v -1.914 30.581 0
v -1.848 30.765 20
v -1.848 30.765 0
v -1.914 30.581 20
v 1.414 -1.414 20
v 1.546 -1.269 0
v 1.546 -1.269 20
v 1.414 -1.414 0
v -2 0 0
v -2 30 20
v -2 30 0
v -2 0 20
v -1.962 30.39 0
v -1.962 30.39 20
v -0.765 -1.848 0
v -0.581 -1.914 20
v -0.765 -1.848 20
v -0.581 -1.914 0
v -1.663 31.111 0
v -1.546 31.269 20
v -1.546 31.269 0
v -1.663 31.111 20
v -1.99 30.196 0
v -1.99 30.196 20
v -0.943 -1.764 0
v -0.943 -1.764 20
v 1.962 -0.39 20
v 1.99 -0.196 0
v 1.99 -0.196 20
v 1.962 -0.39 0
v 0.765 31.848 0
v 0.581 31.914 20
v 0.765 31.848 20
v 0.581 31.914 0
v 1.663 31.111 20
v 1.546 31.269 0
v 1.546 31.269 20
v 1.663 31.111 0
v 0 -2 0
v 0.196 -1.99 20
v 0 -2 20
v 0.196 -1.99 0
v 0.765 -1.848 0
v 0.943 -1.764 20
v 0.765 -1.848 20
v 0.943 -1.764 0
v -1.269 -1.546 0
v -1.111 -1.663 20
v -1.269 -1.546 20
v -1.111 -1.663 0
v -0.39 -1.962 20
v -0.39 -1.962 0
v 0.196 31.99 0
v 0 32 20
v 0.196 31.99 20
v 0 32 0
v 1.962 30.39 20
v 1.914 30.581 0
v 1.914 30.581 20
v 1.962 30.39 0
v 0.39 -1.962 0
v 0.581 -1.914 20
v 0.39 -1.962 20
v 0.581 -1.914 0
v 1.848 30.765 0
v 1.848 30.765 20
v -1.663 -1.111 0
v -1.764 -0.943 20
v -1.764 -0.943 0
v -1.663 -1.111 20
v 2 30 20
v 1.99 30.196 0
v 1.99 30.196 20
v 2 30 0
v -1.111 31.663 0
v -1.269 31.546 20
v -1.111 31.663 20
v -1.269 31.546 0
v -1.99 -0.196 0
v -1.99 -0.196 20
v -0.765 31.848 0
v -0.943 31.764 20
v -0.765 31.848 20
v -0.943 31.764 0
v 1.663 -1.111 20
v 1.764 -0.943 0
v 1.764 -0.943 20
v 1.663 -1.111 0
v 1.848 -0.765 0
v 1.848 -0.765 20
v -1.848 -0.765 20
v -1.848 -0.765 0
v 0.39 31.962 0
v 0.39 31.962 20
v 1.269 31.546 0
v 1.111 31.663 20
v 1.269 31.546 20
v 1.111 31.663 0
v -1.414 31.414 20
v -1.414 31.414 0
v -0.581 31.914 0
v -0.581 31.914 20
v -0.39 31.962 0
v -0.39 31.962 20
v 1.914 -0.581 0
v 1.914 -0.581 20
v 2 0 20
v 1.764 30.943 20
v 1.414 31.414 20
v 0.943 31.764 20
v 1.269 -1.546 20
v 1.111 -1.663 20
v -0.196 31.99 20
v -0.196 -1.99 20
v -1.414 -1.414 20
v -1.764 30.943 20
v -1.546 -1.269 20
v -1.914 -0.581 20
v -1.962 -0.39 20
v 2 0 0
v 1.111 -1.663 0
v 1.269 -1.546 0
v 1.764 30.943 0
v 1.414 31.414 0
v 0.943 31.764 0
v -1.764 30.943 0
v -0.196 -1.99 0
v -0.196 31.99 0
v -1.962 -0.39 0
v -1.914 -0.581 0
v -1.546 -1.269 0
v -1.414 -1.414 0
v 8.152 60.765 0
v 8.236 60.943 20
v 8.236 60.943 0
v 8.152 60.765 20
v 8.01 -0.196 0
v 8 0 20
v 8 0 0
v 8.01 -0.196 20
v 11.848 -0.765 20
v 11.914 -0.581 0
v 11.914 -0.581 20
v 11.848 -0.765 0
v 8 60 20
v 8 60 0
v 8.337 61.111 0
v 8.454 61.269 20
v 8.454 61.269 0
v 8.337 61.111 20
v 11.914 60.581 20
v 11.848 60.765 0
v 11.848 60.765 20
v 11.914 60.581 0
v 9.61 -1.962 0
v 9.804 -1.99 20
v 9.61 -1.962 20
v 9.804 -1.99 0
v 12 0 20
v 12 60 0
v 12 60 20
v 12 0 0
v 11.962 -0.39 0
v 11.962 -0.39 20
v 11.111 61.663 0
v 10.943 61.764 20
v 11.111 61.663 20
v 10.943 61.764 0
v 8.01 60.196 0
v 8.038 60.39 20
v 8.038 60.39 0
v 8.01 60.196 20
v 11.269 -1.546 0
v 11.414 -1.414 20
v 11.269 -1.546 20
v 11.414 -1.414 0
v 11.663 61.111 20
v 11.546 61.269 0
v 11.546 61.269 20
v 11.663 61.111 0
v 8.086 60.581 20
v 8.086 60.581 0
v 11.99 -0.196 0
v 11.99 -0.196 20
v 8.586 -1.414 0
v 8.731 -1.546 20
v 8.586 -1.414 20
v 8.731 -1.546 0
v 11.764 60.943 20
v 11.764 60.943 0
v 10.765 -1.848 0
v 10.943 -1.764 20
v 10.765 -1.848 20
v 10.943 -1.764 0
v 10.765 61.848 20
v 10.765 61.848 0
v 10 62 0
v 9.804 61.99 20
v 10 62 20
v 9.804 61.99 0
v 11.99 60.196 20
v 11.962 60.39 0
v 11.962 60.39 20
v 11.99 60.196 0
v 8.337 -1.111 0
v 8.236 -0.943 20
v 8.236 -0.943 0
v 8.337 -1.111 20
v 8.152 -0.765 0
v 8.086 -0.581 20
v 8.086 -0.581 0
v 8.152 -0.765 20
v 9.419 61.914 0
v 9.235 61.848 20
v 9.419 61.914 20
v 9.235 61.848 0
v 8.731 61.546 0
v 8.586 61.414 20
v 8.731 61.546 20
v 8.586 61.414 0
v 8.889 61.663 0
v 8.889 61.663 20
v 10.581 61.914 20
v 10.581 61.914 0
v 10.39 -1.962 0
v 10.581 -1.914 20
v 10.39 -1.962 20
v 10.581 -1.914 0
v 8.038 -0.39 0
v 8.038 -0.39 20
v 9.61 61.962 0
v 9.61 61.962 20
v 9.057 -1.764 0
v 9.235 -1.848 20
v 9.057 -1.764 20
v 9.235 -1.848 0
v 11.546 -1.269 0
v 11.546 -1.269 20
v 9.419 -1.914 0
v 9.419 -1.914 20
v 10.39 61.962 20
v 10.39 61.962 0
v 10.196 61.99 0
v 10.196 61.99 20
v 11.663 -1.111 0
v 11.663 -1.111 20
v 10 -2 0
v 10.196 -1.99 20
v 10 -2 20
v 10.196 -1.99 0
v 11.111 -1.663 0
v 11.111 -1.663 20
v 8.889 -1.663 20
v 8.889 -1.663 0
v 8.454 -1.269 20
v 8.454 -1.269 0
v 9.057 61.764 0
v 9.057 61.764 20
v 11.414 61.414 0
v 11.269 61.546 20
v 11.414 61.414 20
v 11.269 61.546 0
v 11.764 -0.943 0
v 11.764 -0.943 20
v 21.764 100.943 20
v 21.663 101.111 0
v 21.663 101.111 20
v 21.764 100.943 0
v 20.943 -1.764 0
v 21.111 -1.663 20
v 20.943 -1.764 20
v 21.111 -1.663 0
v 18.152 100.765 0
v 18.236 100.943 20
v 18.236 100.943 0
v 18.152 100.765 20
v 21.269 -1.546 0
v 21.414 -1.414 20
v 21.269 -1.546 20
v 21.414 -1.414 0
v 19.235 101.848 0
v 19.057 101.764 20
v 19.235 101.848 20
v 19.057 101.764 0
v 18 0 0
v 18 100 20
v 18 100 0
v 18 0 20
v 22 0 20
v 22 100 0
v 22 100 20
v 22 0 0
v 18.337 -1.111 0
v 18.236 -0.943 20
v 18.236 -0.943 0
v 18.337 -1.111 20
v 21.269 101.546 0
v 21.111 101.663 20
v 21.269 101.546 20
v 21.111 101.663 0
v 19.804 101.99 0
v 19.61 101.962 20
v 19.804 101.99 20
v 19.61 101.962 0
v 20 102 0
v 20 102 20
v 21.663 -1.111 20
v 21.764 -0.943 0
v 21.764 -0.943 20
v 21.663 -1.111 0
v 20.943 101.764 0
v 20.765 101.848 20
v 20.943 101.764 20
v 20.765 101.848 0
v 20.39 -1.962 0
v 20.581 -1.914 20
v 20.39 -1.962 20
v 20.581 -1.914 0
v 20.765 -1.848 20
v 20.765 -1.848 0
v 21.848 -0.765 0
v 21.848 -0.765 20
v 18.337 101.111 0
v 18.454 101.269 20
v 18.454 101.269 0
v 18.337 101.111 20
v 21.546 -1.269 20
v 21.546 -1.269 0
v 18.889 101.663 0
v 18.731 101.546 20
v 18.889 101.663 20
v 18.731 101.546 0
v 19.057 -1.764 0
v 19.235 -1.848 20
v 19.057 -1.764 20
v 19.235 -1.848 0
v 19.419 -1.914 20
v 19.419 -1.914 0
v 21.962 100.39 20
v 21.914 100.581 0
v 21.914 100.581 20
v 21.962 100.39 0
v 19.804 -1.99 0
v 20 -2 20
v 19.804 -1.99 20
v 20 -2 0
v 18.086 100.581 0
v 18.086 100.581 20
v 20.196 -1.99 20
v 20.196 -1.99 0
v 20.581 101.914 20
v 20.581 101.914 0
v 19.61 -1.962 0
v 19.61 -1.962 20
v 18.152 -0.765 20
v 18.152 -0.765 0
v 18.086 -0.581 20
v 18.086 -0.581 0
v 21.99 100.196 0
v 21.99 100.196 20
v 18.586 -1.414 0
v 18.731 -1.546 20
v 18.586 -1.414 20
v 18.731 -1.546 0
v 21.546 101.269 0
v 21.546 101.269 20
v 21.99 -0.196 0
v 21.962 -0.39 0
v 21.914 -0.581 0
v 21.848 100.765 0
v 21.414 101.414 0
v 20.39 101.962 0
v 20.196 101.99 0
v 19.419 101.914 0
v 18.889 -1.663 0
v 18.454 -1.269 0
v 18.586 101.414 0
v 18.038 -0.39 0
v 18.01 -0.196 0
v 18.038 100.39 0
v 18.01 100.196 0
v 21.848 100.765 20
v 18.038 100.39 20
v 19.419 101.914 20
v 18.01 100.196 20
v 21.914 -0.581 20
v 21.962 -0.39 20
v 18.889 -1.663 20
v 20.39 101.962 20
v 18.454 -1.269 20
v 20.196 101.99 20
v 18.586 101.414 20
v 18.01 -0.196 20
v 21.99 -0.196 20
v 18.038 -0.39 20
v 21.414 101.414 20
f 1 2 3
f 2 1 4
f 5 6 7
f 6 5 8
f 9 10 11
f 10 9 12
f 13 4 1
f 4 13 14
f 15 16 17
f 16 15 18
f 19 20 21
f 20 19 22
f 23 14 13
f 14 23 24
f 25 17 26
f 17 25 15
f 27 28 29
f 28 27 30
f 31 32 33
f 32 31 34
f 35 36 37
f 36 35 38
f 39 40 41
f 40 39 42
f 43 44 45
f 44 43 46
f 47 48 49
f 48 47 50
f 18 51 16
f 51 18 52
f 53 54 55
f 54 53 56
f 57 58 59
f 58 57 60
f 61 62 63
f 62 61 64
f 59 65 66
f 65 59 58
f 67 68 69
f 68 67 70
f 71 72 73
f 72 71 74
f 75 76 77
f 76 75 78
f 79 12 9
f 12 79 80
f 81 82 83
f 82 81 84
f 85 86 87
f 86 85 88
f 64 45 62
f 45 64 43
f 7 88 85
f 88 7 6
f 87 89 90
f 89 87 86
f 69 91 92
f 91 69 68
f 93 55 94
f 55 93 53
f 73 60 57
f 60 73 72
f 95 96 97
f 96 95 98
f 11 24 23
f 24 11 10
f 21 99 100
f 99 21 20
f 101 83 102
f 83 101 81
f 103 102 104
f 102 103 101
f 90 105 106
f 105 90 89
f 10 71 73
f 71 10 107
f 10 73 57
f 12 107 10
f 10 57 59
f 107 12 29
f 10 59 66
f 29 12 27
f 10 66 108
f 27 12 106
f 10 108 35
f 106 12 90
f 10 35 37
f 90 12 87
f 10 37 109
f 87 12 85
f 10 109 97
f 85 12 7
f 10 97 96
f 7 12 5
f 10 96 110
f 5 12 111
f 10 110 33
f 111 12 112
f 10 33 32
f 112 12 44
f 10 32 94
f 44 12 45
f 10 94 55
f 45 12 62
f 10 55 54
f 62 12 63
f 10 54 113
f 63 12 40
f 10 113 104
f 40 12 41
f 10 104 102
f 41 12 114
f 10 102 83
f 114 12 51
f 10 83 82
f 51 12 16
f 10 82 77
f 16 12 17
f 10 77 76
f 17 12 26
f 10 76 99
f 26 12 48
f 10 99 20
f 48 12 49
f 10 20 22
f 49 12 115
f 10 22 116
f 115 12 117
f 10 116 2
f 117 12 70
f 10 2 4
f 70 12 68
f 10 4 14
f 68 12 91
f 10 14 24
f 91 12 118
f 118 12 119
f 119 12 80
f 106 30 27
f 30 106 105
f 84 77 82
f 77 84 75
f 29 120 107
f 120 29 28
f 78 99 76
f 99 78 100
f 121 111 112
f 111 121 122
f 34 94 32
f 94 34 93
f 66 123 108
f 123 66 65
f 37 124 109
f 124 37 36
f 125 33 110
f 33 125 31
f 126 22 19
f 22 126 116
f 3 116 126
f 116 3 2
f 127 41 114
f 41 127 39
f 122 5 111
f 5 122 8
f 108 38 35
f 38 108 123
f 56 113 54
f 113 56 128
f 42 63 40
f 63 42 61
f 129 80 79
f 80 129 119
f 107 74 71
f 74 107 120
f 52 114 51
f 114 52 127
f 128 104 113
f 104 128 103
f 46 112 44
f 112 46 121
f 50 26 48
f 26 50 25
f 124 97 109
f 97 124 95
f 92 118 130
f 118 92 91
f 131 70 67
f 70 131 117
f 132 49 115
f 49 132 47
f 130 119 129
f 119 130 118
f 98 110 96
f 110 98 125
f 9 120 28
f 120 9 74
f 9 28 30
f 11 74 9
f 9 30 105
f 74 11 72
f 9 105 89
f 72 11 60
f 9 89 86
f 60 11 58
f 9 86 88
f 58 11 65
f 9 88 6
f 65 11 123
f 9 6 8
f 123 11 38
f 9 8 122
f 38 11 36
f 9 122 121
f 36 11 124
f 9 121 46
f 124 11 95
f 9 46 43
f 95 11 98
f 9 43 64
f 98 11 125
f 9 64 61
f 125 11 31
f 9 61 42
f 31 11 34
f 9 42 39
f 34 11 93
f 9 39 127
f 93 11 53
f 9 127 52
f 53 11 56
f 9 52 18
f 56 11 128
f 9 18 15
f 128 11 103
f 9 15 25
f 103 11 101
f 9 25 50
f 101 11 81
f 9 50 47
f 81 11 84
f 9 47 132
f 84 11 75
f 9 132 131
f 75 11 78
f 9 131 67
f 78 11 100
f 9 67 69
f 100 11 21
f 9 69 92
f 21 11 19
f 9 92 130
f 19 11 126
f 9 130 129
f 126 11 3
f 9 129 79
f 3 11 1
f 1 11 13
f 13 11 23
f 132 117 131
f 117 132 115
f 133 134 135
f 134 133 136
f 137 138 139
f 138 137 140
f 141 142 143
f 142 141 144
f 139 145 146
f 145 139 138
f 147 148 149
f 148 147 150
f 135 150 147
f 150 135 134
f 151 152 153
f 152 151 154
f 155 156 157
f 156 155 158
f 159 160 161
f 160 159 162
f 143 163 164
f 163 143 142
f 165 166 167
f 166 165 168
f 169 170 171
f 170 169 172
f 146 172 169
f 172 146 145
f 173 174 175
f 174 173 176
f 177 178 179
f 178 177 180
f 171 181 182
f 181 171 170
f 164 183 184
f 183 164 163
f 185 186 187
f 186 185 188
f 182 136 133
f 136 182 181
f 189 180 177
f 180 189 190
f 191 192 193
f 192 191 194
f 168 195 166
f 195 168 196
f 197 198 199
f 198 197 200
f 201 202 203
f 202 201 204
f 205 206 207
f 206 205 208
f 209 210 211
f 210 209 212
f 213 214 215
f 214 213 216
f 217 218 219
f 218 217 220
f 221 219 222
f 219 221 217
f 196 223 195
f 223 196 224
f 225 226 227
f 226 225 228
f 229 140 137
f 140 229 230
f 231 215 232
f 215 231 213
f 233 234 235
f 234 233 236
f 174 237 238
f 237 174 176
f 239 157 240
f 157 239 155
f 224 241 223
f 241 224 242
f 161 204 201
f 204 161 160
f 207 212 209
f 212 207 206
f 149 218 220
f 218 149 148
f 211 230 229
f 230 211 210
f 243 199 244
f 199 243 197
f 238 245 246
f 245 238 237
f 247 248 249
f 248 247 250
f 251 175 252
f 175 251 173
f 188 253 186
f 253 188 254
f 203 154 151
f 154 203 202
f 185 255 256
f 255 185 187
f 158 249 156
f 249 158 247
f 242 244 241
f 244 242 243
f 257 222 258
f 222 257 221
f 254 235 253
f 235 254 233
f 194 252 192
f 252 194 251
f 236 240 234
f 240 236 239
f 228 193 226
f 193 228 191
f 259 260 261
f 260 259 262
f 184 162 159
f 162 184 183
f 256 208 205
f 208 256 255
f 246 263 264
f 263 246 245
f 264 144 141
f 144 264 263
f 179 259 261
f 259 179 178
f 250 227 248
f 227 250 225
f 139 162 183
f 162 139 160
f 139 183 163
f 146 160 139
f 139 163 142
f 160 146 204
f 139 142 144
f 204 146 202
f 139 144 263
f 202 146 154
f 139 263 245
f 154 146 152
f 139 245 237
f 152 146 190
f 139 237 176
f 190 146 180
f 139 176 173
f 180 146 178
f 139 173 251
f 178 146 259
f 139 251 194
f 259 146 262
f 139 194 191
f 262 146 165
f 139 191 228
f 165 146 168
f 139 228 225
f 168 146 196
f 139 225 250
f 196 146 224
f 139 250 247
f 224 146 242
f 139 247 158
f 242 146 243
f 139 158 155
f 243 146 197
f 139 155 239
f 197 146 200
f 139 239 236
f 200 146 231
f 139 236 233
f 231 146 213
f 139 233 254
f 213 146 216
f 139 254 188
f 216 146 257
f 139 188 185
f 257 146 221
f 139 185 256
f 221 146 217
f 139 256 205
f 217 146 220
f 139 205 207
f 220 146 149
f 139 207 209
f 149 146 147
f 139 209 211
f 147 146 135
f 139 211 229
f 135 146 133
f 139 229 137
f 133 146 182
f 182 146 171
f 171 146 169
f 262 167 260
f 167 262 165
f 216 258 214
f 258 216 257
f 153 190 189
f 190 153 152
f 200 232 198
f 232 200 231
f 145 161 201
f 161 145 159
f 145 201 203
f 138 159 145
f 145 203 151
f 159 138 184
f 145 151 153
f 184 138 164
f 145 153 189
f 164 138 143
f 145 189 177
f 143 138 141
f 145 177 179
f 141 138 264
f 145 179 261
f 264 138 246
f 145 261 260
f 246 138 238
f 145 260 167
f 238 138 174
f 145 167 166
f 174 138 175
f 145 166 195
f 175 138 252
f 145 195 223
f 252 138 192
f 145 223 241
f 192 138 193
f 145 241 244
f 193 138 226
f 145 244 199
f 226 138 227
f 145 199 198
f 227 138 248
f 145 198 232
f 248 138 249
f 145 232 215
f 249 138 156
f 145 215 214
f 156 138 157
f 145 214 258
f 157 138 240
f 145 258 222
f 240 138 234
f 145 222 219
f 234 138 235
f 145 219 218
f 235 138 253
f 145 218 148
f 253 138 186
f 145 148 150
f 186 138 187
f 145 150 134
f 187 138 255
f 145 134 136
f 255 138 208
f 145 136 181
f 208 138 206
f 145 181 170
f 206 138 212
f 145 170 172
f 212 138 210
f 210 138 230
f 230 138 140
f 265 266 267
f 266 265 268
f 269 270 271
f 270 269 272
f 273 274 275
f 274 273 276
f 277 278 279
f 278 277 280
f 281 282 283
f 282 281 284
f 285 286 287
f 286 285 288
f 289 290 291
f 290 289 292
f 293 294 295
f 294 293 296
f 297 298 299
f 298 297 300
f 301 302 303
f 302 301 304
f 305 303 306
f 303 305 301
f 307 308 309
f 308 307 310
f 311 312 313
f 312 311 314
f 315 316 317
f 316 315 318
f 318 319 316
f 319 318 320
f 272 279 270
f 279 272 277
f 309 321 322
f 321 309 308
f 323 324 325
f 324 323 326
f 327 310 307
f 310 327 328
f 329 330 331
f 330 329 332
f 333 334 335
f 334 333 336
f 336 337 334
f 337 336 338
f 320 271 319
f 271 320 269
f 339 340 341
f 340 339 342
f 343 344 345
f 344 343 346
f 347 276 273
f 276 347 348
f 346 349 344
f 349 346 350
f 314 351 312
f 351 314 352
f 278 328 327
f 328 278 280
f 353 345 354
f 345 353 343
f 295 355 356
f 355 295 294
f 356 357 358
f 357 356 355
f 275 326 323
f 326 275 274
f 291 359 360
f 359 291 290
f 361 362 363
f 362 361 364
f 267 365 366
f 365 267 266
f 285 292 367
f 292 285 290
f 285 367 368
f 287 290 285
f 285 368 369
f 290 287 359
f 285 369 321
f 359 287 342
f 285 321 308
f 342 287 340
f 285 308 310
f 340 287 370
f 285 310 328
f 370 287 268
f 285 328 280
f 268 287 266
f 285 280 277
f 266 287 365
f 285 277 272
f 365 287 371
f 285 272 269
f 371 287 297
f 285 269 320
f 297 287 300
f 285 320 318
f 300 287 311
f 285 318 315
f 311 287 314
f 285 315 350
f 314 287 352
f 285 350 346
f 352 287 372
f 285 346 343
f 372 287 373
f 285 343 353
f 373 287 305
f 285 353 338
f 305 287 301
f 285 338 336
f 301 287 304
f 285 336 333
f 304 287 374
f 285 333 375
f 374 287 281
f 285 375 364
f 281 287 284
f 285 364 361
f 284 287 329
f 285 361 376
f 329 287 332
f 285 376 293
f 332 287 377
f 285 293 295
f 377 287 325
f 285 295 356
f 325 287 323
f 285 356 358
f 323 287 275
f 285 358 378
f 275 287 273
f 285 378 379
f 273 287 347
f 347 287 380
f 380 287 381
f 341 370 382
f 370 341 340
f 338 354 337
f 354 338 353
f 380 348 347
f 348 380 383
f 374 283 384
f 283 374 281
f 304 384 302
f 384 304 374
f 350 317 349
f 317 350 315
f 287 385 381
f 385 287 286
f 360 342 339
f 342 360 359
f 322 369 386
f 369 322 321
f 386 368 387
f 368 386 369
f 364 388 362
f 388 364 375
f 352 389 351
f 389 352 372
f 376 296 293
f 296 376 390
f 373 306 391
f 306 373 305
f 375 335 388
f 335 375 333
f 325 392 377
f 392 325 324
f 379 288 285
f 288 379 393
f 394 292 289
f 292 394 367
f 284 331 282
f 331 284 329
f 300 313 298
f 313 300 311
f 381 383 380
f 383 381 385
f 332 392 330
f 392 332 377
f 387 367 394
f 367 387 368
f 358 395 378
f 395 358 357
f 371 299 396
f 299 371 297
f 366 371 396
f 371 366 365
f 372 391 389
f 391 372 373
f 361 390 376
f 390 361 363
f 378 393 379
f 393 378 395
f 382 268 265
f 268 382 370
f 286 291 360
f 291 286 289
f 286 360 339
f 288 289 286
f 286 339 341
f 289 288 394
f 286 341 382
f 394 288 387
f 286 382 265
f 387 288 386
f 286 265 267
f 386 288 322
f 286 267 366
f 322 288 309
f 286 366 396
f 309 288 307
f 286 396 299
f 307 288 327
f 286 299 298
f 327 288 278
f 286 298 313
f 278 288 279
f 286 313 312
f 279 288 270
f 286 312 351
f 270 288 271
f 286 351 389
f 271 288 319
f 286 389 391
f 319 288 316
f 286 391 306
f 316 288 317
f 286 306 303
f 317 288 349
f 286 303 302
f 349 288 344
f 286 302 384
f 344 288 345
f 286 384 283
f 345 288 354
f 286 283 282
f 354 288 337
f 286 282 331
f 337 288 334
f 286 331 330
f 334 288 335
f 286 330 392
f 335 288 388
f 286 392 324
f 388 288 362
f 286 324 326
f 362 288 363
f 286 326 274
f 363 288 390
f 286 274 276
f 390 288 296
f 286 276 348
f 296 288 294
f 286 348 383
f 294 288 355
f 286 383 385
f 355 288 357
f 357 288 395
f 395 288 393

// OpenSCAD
//
// Misc library
//
// by Yasuhiro Wabiko
//
// This work is licensed under a Creative Commons Attribution 4.0 International License.
// https://creativecommons.org/licenses/by/4.0/
//
// See
//    https://github.com/ywabiko/3d/blob/master/Speaker/README.md
// for build instructions.
//

WELDING=0.1;

round2_plate(30,20,2);

translate([10,0,0])
  round2_plate(60,20,2);

translate([20,0,0])
  round2_plate(100,20,2);


module round2_plate(width, height, radius)
{
    hull(){
        translate([0,0,0])
            cylinder(r=radius, h=height, $fn=64);
        translate([0,width,0])
            cylinder(r=radius, h=height, $fn=64);
    }
}


module round2_plate_triangled(width, height, radius1, radius2)
{
    hull(){
        translate([0,0,0])
            cylinder(r=radius1, h=height, $fn=64);
        translate([0,width,0])
            cylinder(r=radius2, h=height, $fn=64);
    }
}


// px,py,pz has to be larger than r*2
// alignment: (x,y,z) = (0, py0/2, 0)
module prim_round_cube(px0, py0, pz0,  pr0, pf)
{
    pr = pr0;
    px = px0 - pr*2;
    py = py0 - pr*2;
    pz = pz0 - pr*2;
    translate([(px+pr*2)/2, 0, (pz+pr*2)/2])
    minkowski(){
        cube([px, py, pz], center=true);
        sphere(r=pr, $fn=32);
    }
}

// px,py,pz has to be larger than r*2
// alignment: (x,y,z) = (0, py0/2, 0)
module prim_round_cube0(px0, py0, pz0,  pr0, pf)
{
    pr = pr0;
    px = px0 - pr*2;
    py = py0 - pr*2;
    pz = pz0 - pr*2;
    translate([0, 0, 0])
    minkowski(){
        cube([px, py, pz], center=true);
        sphere(r=pr, $fn=pf);
    }
}

// px0,py0 = width(x-axis),height(y-axis), center at (0,0), facing x-axis posiive
// pz = thickness (z-axis from z=0)
// pr = r
// fn = $fn
module prim_round_xplate(px0, py0, pz0,  pr, pf)
{
    px = px0;
    py = py0-pr*2;
    pz = pz0-pr*2;
      
    hull(){
        translate([0,-py/2,-pz/2])
          rotate([0,90,0])
            cylinder(r=pr, h=px, $fn=pf, center=true);
        translate([0,+py/2, -pz/2])
          rotate([0,90,0])
            cylinder(r=pr,h=px, $fn=pf, center=true);
        translate([0,-py/2, +pz/2])
          rotate([0,90,0])
            cylinder(r=pr,h=px, $fn=pf, center=true);
        translate([0,+py/2, +pz/2])
          rotate([0,90,0])
            cylinder(r=pr, h=px, $fn=pf, center=true);
    }
}

// center at (x/2,y/2,z/2), facing z-axis positive
module prim_round_zplate0(px0, py0, pz0,  pr, pf)
{
    px = px0-pr*2;
    py = py0-pr*2;
    pz = pz0;
    hull(){
        translate([ px/2,  py/2, 0])
            cylinder(r=pr, h=pz, $fn=pf, center=true);
        translate([-px/2,  py/2, 0])
            cylinder(r=pr, h=pz, $fn=pf, center=true);
        translate([ px/2, -py/2, 0])
            cylinder(r=pr, h=pz, $fn=pf, center=true);
        translate([-px/2, -py/2, 0])
            cylinder(r=pr, h=pz, $fn=pf, center=true);
    }    
}

// center at (x/2,y/2,z/2), facing x-axis positive
module prim_round_xplate0(pz0, py0, px0,  pr, pf)
{
    px = px0-pr*2;
    py = py0-pr*2;
    pz = pz0;
    rotate([0,90,0])
    hull(){
        translate([ px/2,  py/2, 0])
            cylinder(r=pr, h=pz, $fn=pf, center=true);
        translate([-px/2,  py/2, 0])
            cylinder(r=pr, h=pz, $fn=pf, center=true);
        translate([ px/2, -py/2, 0])
            cylinder(r=pr, h=pz, $fn=pf, center=true);
        translate([-px/2, -py/2, 0])
            cylinder(r=pr, h=pz, $fn=pf, center=true);
    }    
}

// center at (x/2,y/2,z/2), facing y-axis positive
module prim_round_yplate0(px0, pz0, py0, pr, pf)
{
    px = px0-pr*2;
    py = py0-pr*2;
    pz = pz0;
    rotate([90,0,0])
    hull(){
        translate([ px/2,  py/2, 0])
            cylinder(r=pr, h=pz, $fn=pf, center=true);
        translate([-px/2,  py/2, 0])
            cylinder(r=pr, h=pz, $fn=pf, center=true);
        translate([ px/2, -py/2, 0])
            cylinder(r=pr, h=pz, $fn=pf, center=true);
        translate([-px/2, -py/2, 0])
            cylinder(r=pr, h=pz, $fn=pf, center=true);
    }    
}


//
// Screw Holes
//
default_wall_t = 2;

// [Public]
// #2 1/8" screw hole (diameter 2mm x depth 3mm)
// wall thickness = 2mm by default, so overall dimension is 6mm x 6mm x 5mm high.
// align = { "none" : centered at (0,0,0) facing z-axis positive (same as zplate0)
//           "x"    : aligned to yz-plane, facing x-axis positive.
//           "y"    : aligned to zx-plane, facing y-axis positive.
//           "z"    : aligned to xy-plane, facing z-axis positive.
//          }
module screw_hole_d2_h3(align="none", wall_t = default_wall_t, volume_type="positive",
                        shell_x=0, shell_y=0, shell_z=0, with_shell=0){
    hole_d = 2;
    hole_z = 3;
    screw_hole_body(align=align, hole_d=hole_d, hole_z=hole_z, wall_t=wall_t, volume_type=volume_type,
                    shell_x=shell_x, shell_y=shell_y, shell_z=shell_z, with_shell=with_shell);
}

// [Public]
// #4-3/8" screw (diameter 2.8mm x depth 9.5mm)
// wall thickness = 2mm by default, so overall dimension is 6.8mm x 6.8mm x 9.7mm high.
// align = { "none" : centered at (0,0,0) facing z-axis positive (same as zplate0)
//           "x"    : aligned to yz-plane, facing x-axis positive.
//           "y"    : aligned to zx-plane, facing y-axis positive.
//           "z"    : aligned to xy-plane, facing z-axis positive.
//          }
module screw_hole_d28_h95(align="none", wall_t = default_wall_t, volume_type="positive",
                          shell_x=0, shell_y=0, shell_z=0, with_shell=0)
{
    hole_d = 2.8;
    hole_z = 9.5;
    screw_hole_body(align=align, hole_d=hole_d, hole_z=hole_z, wall_t=wall_t, volume_type=volume_type,
        shell_x=shell_x, shell_y=shell_y, shell_z=shell_z, with_shell=with_shell);
}


//
// internal modules
//

// Calculate shell dimension and delegate to each alignment-specific modules.
module screw_hole_body(align="none", hole_d, hole_z, wall_t = default_wall_t, volume_type="positive",
                       shell_x=0, shell_y=0, shell_z=0, with_shell=0) {

    unit_x = (1-with_shell)*(hole_d+wall_t*2) + with_shell*shell_x;
    unit_y = (1-with_shell)*(hole_d+wall_t*2) + with_shell*shell_y; 
    unit_z = (1-with_shell)*hole_z+wall_t + with_shell*shell_z;

    if (align == "none") {
        screw_hole_zplate0(hole_d=hole_d, hole_z=hole_z, wall_t=wall_t, unit_x=unit_x, unit_y=unit_y, unit_z=unit_z, volume_type=volume_type,
                           shell_x=shell_x, shell_y=shell_y, shell_z=shell_z, with_shell=with_shell);
    }
    if (align == "x") {
        screw_hole_align_x(hole_d=hole_d, hole_z=hole_z, wall_t=wall_t, unit_x=unit_x, unit_y=unit_y, unit_z=unit_z, volume_type=volume_type,
                           shell_x=shell_x, shell_y=shell_y, shell_z=shell_z, with_shell=with_shell);
    }
    if (align == "y") {
        screw_hole_align_y(hole_d=hole_d, hole_z=hole_z, wall_t=wall_t, unit_x=unit_x, unit_y=unit_y, unit_z=unit_z, volume_type=volume_type,
                           shell_x=shell_x, shell_y=shell_y, shell_z=shell_z, with_shell=with_shell);
    }
    if (align == "z") {
        screw_hole_align_z(hole_d=hole_d, hole_z=hole_z, wall_t=wall_t, unit_x=unit_x, unit_y=unit_y, unit_z=unit_z, volume_type=volume_type,
                           shell_x=shell_x, shell_y=shell_y, shell_z=shell_z, with_shell=with_shell);
    }
}

// align = { "x"    : face aligned to yz-plane, facing x-axis positive. }
module screw_hole_align_x(hole_d, hole_z, wall_t, unit_x, unit_y, unit_z, volume_type="positive")
{
    translate([-unit_z/2,0,0])
    {
        rotate([0,90,0]) {
            screw_hole_zplate0(hole_d=hole_d, hole_z=hole_z, wall_t=wall_t, unit_x=unit_x, unit_y=unit_y, unit_z=unit_z, volume_type=volume_type);
        }
    }
}

// align = { "y"    : face aligned to zx-plane, facing y-axis positive. }
module screw_hole_align_y(hole_d, hole_z, wall_t, unit_x, unit_y, unit_z, volume_type="positive")
{
    translate([0,-unit_z/2,0]){
        rotate([-90,0,0]) {
            screw_hole_zplate0(hole_d=hole_d, hole_z=hole_z, wall_t=wall_t, unit_x=unit_x, unit_y=unit_y, unit_z=unit_z, volume_type=volume_type);
        }
    }
}

// align = { "z"    : face aligned to xy-plane, facing z-axis positive. }
module screw_hole_align_z(hole_d, hole_z, wall_t, unit_x, unit_y, unit_z, volume_type="positive")
{
    translate([0,0,-unit_z/2])
    {
        rotate([0,0,0]) {
            screw_hole_zplate0(hole_d=hole_d, hole_z=hole_z, wall_t=wall_t, unit_x=unit_x, unit_y=unit_y, unit_z=unit_z, volume_type=volume_type);
        }
    }
}

// align = { "none" : centered at (0,0,0) facing z-axis positive (same as zplate0) }
module screw_hole_zplate0(hole_d, hole_z, wall_t, unit_x, unit_y, unit_z, volume_type="positive",
                          shell_x=0, shell_y=0, shell_z=0, with_shell=0) {

    if (volume_type == "positive") {
        difference() {
            cube([unit_x, unit_y, unit_z],center=true);
            screw_hole_negative_volume(hole_d=hole_d, hole_z=hole_z, wall_t=wall_t, unit_x=unit_x, unit_y=unit_y, unit_z=unit_z,
                                       shell_x=shell_x, shell_y=shell_y, shell_z=shell_z, with_shell=with_shell);
        }
    } else {
        screw_hole_negative_volume(hole_d=hole_d, hole_z=hole_z, wall_t=wall_t, unit_x=unit_x, unit_y=unit_y, unit_z=unit_z, 
                                   shell_x=shell_x, shell_y=shell_y, shell_z=shell_z, with_shell=with_shell);
    }
}

// negative volume for align = "none" mode. (same as zplate0)
module screw_hole_negative_volume(hole_d, hole_z, wall_t, unit_x, unit_y, unit_z, 
                                  shell_x=0, shell_y=0, shell_z=0, with_shell=0) {


    translate([0,0,unit_z/2-hole_z]) {
        cylinder(r=hole_d/2, h=hole_z+WELDING, $fn=16);
    }
}


//
// class related stuff
// from
// http://forum.openscad.org/parameterized-models-td8303.html
//

// hash for flat style key-value pair
// see get_aligned() below for usage.
function hash00(h, k, _i_=0) = ( 
    _i_>len(h)-1 ? undef  // key not found 
    : h[_i_]==k ?    // key found 
    h[_i_+1]  // return v 
    : hash(h,k,_i_+2)           
    );

function hash(h, k, _i_=0) = ( 
    _i_>len(h)-1 ? undef  // key not found 
    : h[_i_][0]==k ?    // key found 
    h[_i_][1]  // return v 
    : hash(h,k,_i_+1)           
    );

//
// misc utilities
//

//
// get_aligned(align_x, align_y, align_z, size_x, size_y, size_z) 
//
// This returns a point that meets the specified alignment requirement.
// The point returned is located on an edge of the cube
//   - whose size is (size_x, size_y, size_z), and
//   - whose center is at (0,0,0).
//
// align_x = { "front" | "center" | "back" }
// align_y = { "left"  | "center" | "right" }
// align_z = { "top"   | "center" | "bottom" }
// size_x, size_y, size_z = size of the cube
//
// Note: to generate a flat style key-value pair in a human-readable way,
// you have to use concat() for now.
//
_alignment_map = concat([["front", 1],
                        ["center", 0],
                        ["back", -1],
                        ["left", -1],
                        ["right", 1],
                        ["top", 1],
                        ["bottom", -1]]);
    
function get_aligned(align_x, align_y, align_z, size_x, size_y, size_z) = (
    [ hash(_alignment_map, align_x)*size_x/2,
      hash(_alignment_map, align_y)*size_y/2,
      hash(_alignment_map, align_z)*size_z/2 ]);

module get_aligned_verbose(align_x, align_y, align_z, size_x, size_y, size_z) {
    get_aligned_result = get_aligned(align_x, align_y, align_z, size_x, size_y, size_z);
    get_aligned_result2 = [ hash(_alignment_map, align_x)*size_x/2,
                           hash(_alignment_map, align_y)*size_y/2,
                           hash(_alignment_map, align_z)*size_z/2 ];
    echo(get_aligned_result=get_aligned_result);
    echo(get_aligned_result2=get_aligned_result2);
    
}
function front_center(sx, tx) = [-sx/2+tx/2, 0, 0];
function back_center(sx, tx) = [sx/2, 0, 0];
function left_center(sy, ty)  = [0, -sy/2+ty/2, 0];
function right_center(sy, ty) = [0, sy/2-ty/2, 0];
function top_center(sz, tz) = [0, 0, sz/2-tz/2];
function bottom_center(sz, tz) = [0, 0, -sz/2+tz/2];
function board_surface_z(sz, tz) = [0, 0, -sz/2+tz];
